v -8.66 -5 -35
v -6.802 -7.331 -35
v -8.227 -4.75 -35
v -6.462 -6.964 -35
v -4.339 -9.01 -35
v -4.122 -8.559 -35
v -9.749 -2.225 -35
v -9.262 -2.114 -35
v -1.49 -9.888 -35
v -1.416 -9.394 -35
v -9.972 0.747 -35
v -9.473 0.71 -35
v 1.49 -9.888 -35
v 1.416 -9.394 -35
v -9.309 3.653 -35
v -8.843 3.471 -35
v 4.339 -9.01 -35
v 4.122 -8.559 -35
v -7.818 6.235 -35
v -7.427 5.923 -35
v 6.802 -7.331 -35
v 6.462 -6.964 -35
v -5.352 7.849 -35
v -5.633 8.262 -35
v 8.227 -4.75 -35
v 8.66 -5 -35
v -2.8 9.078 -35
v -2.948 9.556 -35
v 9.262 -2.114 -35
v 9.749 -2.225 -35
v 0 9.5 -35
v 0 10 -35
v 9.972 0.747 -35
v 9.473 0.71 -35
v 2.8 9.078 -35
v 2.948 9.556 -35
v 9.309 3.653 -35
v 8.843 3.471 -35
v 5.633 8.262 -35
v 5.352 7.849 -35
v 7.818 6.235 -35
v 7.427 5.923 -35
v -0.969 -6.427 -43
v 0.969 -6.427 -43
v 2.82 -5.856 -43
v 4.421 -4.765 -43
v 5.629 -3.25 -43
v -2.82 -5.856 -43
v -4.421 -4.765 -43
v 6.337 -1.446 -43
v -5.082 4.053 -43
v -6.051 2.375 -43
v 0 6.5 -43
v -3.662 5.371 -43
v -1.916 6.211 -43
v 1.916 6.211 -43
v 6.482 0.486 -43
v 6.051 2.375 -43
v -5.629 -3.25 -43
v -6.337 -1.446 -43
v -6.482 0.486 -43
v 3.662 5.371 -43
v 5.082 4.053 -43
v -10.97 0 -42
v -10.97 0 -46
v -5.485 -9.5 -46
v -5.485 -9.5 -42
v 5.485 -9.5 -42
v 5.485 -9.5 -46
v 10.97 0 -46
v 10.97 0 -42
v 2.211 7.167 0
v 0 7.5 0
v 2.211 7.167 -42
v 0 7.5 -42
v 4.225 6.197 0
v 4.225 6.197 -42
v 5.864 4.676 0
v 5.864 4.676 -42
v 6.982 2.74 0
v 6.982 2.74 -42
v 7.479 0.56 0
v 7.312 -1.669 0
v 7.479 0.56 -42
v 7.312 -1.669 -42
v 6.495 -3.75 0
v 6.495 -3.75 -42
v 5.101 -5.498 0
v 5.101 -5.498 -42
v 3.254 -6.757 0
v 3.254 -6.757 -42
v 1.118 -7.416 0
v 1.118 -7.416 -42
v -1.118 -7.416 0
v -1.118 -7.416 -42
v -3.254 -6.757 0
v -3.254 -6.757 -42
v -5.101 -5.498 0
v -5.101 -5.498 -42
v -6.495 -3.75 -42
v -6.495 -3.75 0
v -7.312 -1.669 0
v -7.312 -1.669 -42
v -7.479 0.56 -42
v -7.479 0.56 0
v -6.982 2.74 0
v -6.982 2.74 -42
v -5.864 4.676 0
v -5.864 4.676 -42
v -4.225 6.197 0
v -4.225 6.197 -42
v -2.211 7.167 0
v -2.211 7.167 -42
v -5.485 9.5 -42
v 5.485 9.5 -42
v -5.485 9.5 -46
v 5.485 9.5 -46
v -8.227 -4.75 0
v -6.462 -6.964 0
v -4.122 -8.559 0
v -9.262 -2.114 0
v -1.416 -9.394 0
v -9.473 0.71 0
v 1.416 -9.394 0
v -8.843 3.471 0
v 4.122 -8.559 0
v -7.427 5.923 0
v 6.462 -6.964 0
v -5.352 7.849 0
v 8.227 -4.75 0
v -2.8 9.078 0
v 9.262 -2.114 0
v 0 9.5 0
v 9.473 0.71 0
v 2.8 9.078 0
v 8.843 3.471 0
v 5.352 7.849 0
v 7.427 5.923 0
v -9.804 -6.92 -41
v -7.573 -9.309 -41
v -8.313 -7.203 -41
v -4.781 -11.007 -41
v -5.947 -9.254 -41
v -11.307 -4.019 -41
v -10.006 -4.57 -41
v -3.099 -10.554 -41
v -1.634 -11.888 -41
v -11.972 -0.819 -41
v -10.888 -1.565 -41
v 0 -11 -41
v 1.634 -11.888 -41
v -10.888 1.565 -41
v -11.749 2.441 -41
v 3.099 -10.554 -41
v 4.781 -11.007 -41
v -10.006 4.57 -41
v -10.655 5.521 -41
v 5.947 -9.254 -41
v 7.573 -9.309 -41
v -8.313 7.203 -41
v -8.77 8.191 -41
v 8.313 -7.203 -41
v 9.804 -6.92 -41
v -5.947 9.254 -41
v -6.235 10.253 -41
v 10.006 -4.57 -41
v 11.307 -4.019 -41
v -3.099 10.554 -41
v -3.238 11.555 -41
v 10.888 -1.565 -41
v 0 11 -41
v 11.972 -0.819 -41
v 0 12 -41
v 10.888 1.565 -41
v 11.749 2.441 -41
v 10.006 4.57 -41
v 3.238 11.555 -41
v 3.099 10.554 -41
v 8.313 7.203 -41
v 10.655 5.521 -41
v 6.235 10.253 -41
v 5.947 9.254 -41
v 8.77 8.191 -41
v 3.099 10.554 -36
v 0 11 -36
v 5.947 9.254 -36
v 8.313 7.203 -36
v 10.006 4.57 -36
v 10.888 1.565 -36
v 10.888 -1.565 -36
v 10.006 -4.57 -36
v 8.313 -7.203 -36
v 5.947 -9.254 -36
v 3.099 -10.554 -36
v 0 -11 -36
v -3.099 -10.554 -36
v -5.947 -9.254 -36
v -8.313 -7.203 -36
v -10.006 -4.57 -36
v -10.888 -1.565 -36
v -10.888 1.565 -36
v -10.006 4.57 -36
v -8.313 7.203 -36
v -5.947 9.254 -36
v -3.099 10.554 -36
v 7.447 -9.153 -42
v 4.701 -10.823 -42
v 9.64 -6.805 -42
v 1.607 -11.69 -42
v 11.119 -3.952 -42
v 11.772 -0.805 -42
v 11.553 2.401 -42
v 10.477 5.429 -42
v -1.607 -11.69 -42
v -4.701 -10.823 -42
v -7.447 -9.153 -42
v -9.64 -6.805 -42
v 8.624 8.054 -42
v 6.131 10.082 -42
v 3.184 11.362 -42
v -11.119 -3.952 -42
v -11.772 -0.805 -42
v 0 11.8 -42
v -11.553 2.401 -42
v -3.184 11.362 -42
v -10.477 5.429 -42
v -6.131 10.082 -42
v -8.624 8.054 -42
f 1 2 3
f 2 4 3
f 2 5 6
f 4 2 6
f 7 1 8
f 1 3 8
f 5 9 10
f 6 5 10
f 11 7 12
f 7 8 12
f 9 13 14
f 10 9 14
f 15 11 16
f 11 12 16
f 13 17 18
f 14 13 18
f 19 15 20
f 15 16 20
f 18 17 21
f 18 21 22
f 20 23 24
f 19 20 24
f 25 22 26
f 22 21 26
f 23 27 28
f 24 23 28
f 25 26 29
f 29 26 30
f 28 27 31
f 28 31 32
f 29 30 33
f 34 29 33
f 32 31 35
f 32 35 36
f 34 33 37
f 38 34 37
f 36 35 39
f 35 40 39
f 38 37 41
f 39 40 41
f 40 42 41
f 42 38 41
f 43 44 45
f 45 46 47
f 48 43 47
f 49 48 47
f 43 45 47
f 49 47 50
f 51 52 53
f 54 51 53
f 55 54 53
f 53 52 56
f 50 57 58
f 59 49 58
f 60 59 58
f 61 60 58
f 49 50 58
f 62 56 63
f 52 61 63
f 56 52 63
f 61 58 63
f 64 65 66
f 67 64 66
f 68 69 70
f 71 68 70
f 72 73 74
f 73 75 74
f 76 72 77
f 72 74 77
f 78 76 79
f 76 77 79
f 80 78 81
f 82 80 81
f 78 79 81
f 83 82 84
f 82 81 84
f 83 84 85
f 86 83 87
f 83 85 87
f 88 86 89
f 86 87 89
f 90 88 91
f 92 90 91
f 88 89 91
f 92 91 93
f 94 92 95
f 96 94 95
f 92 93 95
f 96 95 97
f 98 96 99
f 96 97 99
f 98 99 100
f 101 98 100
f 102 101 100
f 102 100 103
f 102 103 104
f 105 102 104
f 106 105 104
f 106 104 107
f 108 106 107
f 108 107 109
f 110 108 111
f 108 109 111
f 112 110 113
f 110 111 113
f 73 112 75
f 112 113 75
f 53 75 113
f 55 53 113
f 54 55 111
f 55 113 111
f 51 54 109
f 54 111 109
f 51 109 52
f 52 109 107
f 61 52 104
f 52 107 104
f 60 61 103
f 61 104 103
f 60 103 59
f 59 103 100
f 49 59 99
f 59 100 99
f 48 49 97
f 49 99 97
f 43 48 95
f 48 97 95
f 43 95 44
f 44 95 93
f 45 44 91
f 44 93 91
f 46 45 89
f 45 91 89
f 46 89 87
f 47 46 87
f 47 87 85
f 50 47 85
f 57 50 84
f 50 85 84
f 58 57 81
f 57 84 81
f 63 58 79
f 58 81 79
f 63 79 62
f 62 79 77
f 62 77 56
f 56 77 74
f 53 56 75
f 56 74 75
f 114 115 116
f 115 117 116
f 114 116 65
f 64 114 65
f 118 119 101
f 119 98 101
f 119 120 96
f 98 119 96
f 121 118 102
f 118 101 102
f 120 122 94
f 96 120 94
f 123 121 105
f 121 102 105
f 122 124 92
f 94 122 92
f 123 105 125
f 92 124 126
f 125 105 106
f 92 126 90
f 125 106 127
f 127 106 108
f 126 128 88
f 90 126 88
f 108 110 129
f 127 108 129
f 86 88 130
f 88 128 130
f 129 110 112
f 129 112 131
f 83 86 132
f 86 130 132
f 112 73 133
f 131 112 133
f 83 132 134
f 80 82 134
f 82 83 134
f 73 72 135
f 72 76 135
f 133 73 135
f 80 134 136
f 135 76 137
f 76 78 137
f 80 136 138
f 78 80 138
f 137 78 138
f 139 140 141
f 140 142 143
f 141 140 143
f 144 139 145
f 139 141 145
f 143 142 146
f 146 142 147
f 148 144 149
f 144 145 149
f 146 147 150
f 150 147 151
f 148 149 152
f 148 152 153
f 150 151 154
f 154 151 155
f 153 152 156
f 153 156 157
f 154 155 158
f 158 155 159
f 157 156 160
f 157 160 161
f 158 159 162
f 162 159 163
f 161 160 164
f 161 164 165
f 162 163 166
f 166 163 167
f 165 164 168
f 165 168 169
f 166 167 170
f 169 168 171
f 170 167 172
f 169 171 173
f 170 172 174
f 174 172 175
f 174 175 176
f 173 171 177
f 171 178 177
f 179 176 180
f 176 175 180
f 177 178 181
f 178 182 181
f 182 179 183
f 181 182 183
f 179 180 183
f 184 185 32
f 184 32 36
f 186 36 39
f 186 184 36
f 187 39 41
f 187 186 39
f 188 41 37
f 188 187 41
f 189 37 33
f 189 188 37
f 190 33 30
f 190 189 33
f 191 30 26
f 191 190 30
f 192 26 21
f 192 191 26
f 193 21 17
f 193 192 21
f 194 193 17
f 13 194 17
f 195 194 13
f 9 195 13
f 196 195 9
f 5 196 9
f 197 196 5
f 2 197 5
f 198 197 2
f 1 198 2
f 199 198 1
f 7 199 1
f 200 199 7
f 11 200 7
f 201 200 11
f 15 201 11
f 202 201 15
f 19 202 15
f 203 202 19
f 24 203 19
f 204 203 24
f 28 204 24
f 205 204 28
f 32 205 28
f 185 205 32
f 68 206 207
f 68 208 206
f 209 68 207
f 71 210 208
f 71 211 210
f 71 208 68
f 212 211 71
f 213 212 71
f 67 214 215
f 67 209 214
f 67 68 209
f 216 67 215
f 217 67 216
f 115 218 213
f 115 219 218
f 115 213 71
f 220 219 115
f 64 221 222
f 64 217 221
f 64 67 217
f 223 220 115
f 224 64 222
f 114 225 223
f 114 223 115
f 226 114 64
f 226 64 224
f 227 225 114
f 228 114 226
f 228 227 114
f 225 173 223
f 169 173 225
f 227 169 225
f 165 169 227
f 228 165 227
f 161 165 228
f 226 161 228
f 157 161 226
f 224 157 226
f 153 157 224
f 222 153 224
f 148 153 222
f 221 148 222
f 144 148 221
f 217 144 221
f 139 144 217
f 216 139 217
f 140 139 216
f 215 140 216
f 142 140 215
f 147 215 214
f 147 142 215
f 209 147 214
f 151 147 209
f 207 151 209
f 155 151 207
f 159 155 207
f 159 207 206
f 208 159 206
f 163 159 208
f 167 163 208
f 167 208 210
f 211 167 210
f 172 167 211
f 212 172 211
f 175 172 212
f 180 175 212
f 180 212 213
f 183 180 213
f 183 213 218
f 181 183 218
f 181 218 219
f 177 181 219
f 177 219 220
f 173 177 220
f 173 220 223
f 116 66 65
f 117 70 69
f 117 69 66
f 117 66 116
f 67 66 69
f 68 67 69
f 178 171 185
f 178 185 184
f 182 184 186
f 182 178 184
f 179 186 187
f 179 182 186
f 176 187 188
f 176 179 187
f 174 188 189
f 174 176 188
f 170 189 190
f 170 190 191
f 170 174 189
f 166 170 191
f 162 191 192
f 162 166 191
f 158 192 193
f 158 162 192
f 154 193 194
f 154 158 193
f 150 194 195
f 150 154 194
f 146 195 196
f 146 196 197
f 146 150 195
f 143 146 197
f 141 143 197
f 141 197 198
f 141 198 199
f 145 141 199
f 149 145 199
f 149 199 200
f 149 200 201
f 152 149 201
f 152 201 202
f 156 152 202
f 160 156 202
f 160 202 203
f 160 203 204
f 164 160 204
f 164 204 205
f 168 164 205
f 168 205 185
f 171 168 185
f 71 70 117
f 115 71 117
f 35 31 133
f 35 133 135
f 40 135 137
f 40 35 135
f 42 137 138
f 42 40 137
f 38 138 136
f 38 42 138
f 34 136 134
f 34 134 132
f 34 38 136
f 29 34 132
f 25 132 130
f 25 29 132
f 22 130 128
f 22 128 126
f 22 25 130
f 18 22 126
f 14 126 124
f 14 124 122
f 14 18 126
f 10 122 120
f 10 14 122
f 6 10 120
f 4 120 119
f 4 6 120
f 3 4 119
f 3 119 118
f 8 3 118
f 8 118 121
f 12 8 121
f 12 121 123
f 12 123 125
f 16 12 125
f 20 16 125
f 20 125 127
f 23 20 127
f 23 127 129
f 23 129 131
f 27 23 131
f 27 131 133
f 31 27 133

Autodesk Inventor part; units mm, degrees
ref_plane "YZ Plane" through (0, 0, 0) normal (1, 0, 0) x (0, 1, 0)
ref_plane "XZ Plane" through (0, 0, 0) normal (0, 1, 0) x (-1, 0, 0)
ref_plane "XY Plane" through (0, 0, 0) normal (0, 0, 1) x (1, 0, 0)
sketch "Esquisse1" plane through (0, 0, 0) normal (1, 0, 0) x (0, 1, 0)
  line L0 (0, 0) -> (0, -23.6667)
  line L1 (9.5, 0) -> (7.5, 0)
  line L2 (7.5, 0) -> (7.5, -43)
  line L3 (11, -35) -> (11, -41)
  line L4 (7.5, -43) -> (0, -43)
  line L5 (11, -46) -> (0, -46)
  line L6 (0, -43) -> (0, -46)
  line L7 (11, -46) -> (12, -41)
  line L8 (12, -41) -> (11, -41)
  line L9 (11, -35) -> (9.5, -35)
  line L10 (9.5, 0) -> (9.5, -35)
  dimension "d1" = 15
  dimension "d2" = 43
  dimension "d3" = 3
  dimension "d8" = 22
  dimension "d9" = 1
  dimension "d10" = 5
  dimension "d11" = 19
  dimension "d12" = 6
revolve "Révolution1" add sketch "Esquisse1" angle 360 about axis through (0, 0, 0) along (0, 0, -1)
chamfer "Chanfrein1" distance 1 angle 45 1 edges at (0, -7.5, -43)
sketch "Esquisse2" plane through (0, 0, -46) normal (0, 0, -1) x (-1, 0, 0)
  line L0 (5.4848, 9.5) -> (10.9697, 0)
  line L1 (10.9697, 0) -> (5.4848, -9.5)
  line L2 (5.4848, -9.5) -> (-5.4848, -9.5)
  line L3 (-5.4848, -9.5) -> (-10.9697, 0)
  line L4 (-10.9697, 0) -> (-5.4848, 9.5)
  line L5 (-5.4848, 9.5) -> (5.4848, 9.5)
  circle A0 centre (0, 0) radius 12 projected
  circle A1 centre (0, 0) radius 11 projected
  dimension "d13" = 19
extrude "Extrusion1" cut sketch "Esquisse2" against normal blind 4 contours A0 | A1
thread "Filetage1" size "M22x1.5" class "6g" standard "ISO Metric profile" full length
chamfer "Chanfrein2" distance 1 angle 45 1 edges at (0, -11, -35)
properties part number "piston_corps"
